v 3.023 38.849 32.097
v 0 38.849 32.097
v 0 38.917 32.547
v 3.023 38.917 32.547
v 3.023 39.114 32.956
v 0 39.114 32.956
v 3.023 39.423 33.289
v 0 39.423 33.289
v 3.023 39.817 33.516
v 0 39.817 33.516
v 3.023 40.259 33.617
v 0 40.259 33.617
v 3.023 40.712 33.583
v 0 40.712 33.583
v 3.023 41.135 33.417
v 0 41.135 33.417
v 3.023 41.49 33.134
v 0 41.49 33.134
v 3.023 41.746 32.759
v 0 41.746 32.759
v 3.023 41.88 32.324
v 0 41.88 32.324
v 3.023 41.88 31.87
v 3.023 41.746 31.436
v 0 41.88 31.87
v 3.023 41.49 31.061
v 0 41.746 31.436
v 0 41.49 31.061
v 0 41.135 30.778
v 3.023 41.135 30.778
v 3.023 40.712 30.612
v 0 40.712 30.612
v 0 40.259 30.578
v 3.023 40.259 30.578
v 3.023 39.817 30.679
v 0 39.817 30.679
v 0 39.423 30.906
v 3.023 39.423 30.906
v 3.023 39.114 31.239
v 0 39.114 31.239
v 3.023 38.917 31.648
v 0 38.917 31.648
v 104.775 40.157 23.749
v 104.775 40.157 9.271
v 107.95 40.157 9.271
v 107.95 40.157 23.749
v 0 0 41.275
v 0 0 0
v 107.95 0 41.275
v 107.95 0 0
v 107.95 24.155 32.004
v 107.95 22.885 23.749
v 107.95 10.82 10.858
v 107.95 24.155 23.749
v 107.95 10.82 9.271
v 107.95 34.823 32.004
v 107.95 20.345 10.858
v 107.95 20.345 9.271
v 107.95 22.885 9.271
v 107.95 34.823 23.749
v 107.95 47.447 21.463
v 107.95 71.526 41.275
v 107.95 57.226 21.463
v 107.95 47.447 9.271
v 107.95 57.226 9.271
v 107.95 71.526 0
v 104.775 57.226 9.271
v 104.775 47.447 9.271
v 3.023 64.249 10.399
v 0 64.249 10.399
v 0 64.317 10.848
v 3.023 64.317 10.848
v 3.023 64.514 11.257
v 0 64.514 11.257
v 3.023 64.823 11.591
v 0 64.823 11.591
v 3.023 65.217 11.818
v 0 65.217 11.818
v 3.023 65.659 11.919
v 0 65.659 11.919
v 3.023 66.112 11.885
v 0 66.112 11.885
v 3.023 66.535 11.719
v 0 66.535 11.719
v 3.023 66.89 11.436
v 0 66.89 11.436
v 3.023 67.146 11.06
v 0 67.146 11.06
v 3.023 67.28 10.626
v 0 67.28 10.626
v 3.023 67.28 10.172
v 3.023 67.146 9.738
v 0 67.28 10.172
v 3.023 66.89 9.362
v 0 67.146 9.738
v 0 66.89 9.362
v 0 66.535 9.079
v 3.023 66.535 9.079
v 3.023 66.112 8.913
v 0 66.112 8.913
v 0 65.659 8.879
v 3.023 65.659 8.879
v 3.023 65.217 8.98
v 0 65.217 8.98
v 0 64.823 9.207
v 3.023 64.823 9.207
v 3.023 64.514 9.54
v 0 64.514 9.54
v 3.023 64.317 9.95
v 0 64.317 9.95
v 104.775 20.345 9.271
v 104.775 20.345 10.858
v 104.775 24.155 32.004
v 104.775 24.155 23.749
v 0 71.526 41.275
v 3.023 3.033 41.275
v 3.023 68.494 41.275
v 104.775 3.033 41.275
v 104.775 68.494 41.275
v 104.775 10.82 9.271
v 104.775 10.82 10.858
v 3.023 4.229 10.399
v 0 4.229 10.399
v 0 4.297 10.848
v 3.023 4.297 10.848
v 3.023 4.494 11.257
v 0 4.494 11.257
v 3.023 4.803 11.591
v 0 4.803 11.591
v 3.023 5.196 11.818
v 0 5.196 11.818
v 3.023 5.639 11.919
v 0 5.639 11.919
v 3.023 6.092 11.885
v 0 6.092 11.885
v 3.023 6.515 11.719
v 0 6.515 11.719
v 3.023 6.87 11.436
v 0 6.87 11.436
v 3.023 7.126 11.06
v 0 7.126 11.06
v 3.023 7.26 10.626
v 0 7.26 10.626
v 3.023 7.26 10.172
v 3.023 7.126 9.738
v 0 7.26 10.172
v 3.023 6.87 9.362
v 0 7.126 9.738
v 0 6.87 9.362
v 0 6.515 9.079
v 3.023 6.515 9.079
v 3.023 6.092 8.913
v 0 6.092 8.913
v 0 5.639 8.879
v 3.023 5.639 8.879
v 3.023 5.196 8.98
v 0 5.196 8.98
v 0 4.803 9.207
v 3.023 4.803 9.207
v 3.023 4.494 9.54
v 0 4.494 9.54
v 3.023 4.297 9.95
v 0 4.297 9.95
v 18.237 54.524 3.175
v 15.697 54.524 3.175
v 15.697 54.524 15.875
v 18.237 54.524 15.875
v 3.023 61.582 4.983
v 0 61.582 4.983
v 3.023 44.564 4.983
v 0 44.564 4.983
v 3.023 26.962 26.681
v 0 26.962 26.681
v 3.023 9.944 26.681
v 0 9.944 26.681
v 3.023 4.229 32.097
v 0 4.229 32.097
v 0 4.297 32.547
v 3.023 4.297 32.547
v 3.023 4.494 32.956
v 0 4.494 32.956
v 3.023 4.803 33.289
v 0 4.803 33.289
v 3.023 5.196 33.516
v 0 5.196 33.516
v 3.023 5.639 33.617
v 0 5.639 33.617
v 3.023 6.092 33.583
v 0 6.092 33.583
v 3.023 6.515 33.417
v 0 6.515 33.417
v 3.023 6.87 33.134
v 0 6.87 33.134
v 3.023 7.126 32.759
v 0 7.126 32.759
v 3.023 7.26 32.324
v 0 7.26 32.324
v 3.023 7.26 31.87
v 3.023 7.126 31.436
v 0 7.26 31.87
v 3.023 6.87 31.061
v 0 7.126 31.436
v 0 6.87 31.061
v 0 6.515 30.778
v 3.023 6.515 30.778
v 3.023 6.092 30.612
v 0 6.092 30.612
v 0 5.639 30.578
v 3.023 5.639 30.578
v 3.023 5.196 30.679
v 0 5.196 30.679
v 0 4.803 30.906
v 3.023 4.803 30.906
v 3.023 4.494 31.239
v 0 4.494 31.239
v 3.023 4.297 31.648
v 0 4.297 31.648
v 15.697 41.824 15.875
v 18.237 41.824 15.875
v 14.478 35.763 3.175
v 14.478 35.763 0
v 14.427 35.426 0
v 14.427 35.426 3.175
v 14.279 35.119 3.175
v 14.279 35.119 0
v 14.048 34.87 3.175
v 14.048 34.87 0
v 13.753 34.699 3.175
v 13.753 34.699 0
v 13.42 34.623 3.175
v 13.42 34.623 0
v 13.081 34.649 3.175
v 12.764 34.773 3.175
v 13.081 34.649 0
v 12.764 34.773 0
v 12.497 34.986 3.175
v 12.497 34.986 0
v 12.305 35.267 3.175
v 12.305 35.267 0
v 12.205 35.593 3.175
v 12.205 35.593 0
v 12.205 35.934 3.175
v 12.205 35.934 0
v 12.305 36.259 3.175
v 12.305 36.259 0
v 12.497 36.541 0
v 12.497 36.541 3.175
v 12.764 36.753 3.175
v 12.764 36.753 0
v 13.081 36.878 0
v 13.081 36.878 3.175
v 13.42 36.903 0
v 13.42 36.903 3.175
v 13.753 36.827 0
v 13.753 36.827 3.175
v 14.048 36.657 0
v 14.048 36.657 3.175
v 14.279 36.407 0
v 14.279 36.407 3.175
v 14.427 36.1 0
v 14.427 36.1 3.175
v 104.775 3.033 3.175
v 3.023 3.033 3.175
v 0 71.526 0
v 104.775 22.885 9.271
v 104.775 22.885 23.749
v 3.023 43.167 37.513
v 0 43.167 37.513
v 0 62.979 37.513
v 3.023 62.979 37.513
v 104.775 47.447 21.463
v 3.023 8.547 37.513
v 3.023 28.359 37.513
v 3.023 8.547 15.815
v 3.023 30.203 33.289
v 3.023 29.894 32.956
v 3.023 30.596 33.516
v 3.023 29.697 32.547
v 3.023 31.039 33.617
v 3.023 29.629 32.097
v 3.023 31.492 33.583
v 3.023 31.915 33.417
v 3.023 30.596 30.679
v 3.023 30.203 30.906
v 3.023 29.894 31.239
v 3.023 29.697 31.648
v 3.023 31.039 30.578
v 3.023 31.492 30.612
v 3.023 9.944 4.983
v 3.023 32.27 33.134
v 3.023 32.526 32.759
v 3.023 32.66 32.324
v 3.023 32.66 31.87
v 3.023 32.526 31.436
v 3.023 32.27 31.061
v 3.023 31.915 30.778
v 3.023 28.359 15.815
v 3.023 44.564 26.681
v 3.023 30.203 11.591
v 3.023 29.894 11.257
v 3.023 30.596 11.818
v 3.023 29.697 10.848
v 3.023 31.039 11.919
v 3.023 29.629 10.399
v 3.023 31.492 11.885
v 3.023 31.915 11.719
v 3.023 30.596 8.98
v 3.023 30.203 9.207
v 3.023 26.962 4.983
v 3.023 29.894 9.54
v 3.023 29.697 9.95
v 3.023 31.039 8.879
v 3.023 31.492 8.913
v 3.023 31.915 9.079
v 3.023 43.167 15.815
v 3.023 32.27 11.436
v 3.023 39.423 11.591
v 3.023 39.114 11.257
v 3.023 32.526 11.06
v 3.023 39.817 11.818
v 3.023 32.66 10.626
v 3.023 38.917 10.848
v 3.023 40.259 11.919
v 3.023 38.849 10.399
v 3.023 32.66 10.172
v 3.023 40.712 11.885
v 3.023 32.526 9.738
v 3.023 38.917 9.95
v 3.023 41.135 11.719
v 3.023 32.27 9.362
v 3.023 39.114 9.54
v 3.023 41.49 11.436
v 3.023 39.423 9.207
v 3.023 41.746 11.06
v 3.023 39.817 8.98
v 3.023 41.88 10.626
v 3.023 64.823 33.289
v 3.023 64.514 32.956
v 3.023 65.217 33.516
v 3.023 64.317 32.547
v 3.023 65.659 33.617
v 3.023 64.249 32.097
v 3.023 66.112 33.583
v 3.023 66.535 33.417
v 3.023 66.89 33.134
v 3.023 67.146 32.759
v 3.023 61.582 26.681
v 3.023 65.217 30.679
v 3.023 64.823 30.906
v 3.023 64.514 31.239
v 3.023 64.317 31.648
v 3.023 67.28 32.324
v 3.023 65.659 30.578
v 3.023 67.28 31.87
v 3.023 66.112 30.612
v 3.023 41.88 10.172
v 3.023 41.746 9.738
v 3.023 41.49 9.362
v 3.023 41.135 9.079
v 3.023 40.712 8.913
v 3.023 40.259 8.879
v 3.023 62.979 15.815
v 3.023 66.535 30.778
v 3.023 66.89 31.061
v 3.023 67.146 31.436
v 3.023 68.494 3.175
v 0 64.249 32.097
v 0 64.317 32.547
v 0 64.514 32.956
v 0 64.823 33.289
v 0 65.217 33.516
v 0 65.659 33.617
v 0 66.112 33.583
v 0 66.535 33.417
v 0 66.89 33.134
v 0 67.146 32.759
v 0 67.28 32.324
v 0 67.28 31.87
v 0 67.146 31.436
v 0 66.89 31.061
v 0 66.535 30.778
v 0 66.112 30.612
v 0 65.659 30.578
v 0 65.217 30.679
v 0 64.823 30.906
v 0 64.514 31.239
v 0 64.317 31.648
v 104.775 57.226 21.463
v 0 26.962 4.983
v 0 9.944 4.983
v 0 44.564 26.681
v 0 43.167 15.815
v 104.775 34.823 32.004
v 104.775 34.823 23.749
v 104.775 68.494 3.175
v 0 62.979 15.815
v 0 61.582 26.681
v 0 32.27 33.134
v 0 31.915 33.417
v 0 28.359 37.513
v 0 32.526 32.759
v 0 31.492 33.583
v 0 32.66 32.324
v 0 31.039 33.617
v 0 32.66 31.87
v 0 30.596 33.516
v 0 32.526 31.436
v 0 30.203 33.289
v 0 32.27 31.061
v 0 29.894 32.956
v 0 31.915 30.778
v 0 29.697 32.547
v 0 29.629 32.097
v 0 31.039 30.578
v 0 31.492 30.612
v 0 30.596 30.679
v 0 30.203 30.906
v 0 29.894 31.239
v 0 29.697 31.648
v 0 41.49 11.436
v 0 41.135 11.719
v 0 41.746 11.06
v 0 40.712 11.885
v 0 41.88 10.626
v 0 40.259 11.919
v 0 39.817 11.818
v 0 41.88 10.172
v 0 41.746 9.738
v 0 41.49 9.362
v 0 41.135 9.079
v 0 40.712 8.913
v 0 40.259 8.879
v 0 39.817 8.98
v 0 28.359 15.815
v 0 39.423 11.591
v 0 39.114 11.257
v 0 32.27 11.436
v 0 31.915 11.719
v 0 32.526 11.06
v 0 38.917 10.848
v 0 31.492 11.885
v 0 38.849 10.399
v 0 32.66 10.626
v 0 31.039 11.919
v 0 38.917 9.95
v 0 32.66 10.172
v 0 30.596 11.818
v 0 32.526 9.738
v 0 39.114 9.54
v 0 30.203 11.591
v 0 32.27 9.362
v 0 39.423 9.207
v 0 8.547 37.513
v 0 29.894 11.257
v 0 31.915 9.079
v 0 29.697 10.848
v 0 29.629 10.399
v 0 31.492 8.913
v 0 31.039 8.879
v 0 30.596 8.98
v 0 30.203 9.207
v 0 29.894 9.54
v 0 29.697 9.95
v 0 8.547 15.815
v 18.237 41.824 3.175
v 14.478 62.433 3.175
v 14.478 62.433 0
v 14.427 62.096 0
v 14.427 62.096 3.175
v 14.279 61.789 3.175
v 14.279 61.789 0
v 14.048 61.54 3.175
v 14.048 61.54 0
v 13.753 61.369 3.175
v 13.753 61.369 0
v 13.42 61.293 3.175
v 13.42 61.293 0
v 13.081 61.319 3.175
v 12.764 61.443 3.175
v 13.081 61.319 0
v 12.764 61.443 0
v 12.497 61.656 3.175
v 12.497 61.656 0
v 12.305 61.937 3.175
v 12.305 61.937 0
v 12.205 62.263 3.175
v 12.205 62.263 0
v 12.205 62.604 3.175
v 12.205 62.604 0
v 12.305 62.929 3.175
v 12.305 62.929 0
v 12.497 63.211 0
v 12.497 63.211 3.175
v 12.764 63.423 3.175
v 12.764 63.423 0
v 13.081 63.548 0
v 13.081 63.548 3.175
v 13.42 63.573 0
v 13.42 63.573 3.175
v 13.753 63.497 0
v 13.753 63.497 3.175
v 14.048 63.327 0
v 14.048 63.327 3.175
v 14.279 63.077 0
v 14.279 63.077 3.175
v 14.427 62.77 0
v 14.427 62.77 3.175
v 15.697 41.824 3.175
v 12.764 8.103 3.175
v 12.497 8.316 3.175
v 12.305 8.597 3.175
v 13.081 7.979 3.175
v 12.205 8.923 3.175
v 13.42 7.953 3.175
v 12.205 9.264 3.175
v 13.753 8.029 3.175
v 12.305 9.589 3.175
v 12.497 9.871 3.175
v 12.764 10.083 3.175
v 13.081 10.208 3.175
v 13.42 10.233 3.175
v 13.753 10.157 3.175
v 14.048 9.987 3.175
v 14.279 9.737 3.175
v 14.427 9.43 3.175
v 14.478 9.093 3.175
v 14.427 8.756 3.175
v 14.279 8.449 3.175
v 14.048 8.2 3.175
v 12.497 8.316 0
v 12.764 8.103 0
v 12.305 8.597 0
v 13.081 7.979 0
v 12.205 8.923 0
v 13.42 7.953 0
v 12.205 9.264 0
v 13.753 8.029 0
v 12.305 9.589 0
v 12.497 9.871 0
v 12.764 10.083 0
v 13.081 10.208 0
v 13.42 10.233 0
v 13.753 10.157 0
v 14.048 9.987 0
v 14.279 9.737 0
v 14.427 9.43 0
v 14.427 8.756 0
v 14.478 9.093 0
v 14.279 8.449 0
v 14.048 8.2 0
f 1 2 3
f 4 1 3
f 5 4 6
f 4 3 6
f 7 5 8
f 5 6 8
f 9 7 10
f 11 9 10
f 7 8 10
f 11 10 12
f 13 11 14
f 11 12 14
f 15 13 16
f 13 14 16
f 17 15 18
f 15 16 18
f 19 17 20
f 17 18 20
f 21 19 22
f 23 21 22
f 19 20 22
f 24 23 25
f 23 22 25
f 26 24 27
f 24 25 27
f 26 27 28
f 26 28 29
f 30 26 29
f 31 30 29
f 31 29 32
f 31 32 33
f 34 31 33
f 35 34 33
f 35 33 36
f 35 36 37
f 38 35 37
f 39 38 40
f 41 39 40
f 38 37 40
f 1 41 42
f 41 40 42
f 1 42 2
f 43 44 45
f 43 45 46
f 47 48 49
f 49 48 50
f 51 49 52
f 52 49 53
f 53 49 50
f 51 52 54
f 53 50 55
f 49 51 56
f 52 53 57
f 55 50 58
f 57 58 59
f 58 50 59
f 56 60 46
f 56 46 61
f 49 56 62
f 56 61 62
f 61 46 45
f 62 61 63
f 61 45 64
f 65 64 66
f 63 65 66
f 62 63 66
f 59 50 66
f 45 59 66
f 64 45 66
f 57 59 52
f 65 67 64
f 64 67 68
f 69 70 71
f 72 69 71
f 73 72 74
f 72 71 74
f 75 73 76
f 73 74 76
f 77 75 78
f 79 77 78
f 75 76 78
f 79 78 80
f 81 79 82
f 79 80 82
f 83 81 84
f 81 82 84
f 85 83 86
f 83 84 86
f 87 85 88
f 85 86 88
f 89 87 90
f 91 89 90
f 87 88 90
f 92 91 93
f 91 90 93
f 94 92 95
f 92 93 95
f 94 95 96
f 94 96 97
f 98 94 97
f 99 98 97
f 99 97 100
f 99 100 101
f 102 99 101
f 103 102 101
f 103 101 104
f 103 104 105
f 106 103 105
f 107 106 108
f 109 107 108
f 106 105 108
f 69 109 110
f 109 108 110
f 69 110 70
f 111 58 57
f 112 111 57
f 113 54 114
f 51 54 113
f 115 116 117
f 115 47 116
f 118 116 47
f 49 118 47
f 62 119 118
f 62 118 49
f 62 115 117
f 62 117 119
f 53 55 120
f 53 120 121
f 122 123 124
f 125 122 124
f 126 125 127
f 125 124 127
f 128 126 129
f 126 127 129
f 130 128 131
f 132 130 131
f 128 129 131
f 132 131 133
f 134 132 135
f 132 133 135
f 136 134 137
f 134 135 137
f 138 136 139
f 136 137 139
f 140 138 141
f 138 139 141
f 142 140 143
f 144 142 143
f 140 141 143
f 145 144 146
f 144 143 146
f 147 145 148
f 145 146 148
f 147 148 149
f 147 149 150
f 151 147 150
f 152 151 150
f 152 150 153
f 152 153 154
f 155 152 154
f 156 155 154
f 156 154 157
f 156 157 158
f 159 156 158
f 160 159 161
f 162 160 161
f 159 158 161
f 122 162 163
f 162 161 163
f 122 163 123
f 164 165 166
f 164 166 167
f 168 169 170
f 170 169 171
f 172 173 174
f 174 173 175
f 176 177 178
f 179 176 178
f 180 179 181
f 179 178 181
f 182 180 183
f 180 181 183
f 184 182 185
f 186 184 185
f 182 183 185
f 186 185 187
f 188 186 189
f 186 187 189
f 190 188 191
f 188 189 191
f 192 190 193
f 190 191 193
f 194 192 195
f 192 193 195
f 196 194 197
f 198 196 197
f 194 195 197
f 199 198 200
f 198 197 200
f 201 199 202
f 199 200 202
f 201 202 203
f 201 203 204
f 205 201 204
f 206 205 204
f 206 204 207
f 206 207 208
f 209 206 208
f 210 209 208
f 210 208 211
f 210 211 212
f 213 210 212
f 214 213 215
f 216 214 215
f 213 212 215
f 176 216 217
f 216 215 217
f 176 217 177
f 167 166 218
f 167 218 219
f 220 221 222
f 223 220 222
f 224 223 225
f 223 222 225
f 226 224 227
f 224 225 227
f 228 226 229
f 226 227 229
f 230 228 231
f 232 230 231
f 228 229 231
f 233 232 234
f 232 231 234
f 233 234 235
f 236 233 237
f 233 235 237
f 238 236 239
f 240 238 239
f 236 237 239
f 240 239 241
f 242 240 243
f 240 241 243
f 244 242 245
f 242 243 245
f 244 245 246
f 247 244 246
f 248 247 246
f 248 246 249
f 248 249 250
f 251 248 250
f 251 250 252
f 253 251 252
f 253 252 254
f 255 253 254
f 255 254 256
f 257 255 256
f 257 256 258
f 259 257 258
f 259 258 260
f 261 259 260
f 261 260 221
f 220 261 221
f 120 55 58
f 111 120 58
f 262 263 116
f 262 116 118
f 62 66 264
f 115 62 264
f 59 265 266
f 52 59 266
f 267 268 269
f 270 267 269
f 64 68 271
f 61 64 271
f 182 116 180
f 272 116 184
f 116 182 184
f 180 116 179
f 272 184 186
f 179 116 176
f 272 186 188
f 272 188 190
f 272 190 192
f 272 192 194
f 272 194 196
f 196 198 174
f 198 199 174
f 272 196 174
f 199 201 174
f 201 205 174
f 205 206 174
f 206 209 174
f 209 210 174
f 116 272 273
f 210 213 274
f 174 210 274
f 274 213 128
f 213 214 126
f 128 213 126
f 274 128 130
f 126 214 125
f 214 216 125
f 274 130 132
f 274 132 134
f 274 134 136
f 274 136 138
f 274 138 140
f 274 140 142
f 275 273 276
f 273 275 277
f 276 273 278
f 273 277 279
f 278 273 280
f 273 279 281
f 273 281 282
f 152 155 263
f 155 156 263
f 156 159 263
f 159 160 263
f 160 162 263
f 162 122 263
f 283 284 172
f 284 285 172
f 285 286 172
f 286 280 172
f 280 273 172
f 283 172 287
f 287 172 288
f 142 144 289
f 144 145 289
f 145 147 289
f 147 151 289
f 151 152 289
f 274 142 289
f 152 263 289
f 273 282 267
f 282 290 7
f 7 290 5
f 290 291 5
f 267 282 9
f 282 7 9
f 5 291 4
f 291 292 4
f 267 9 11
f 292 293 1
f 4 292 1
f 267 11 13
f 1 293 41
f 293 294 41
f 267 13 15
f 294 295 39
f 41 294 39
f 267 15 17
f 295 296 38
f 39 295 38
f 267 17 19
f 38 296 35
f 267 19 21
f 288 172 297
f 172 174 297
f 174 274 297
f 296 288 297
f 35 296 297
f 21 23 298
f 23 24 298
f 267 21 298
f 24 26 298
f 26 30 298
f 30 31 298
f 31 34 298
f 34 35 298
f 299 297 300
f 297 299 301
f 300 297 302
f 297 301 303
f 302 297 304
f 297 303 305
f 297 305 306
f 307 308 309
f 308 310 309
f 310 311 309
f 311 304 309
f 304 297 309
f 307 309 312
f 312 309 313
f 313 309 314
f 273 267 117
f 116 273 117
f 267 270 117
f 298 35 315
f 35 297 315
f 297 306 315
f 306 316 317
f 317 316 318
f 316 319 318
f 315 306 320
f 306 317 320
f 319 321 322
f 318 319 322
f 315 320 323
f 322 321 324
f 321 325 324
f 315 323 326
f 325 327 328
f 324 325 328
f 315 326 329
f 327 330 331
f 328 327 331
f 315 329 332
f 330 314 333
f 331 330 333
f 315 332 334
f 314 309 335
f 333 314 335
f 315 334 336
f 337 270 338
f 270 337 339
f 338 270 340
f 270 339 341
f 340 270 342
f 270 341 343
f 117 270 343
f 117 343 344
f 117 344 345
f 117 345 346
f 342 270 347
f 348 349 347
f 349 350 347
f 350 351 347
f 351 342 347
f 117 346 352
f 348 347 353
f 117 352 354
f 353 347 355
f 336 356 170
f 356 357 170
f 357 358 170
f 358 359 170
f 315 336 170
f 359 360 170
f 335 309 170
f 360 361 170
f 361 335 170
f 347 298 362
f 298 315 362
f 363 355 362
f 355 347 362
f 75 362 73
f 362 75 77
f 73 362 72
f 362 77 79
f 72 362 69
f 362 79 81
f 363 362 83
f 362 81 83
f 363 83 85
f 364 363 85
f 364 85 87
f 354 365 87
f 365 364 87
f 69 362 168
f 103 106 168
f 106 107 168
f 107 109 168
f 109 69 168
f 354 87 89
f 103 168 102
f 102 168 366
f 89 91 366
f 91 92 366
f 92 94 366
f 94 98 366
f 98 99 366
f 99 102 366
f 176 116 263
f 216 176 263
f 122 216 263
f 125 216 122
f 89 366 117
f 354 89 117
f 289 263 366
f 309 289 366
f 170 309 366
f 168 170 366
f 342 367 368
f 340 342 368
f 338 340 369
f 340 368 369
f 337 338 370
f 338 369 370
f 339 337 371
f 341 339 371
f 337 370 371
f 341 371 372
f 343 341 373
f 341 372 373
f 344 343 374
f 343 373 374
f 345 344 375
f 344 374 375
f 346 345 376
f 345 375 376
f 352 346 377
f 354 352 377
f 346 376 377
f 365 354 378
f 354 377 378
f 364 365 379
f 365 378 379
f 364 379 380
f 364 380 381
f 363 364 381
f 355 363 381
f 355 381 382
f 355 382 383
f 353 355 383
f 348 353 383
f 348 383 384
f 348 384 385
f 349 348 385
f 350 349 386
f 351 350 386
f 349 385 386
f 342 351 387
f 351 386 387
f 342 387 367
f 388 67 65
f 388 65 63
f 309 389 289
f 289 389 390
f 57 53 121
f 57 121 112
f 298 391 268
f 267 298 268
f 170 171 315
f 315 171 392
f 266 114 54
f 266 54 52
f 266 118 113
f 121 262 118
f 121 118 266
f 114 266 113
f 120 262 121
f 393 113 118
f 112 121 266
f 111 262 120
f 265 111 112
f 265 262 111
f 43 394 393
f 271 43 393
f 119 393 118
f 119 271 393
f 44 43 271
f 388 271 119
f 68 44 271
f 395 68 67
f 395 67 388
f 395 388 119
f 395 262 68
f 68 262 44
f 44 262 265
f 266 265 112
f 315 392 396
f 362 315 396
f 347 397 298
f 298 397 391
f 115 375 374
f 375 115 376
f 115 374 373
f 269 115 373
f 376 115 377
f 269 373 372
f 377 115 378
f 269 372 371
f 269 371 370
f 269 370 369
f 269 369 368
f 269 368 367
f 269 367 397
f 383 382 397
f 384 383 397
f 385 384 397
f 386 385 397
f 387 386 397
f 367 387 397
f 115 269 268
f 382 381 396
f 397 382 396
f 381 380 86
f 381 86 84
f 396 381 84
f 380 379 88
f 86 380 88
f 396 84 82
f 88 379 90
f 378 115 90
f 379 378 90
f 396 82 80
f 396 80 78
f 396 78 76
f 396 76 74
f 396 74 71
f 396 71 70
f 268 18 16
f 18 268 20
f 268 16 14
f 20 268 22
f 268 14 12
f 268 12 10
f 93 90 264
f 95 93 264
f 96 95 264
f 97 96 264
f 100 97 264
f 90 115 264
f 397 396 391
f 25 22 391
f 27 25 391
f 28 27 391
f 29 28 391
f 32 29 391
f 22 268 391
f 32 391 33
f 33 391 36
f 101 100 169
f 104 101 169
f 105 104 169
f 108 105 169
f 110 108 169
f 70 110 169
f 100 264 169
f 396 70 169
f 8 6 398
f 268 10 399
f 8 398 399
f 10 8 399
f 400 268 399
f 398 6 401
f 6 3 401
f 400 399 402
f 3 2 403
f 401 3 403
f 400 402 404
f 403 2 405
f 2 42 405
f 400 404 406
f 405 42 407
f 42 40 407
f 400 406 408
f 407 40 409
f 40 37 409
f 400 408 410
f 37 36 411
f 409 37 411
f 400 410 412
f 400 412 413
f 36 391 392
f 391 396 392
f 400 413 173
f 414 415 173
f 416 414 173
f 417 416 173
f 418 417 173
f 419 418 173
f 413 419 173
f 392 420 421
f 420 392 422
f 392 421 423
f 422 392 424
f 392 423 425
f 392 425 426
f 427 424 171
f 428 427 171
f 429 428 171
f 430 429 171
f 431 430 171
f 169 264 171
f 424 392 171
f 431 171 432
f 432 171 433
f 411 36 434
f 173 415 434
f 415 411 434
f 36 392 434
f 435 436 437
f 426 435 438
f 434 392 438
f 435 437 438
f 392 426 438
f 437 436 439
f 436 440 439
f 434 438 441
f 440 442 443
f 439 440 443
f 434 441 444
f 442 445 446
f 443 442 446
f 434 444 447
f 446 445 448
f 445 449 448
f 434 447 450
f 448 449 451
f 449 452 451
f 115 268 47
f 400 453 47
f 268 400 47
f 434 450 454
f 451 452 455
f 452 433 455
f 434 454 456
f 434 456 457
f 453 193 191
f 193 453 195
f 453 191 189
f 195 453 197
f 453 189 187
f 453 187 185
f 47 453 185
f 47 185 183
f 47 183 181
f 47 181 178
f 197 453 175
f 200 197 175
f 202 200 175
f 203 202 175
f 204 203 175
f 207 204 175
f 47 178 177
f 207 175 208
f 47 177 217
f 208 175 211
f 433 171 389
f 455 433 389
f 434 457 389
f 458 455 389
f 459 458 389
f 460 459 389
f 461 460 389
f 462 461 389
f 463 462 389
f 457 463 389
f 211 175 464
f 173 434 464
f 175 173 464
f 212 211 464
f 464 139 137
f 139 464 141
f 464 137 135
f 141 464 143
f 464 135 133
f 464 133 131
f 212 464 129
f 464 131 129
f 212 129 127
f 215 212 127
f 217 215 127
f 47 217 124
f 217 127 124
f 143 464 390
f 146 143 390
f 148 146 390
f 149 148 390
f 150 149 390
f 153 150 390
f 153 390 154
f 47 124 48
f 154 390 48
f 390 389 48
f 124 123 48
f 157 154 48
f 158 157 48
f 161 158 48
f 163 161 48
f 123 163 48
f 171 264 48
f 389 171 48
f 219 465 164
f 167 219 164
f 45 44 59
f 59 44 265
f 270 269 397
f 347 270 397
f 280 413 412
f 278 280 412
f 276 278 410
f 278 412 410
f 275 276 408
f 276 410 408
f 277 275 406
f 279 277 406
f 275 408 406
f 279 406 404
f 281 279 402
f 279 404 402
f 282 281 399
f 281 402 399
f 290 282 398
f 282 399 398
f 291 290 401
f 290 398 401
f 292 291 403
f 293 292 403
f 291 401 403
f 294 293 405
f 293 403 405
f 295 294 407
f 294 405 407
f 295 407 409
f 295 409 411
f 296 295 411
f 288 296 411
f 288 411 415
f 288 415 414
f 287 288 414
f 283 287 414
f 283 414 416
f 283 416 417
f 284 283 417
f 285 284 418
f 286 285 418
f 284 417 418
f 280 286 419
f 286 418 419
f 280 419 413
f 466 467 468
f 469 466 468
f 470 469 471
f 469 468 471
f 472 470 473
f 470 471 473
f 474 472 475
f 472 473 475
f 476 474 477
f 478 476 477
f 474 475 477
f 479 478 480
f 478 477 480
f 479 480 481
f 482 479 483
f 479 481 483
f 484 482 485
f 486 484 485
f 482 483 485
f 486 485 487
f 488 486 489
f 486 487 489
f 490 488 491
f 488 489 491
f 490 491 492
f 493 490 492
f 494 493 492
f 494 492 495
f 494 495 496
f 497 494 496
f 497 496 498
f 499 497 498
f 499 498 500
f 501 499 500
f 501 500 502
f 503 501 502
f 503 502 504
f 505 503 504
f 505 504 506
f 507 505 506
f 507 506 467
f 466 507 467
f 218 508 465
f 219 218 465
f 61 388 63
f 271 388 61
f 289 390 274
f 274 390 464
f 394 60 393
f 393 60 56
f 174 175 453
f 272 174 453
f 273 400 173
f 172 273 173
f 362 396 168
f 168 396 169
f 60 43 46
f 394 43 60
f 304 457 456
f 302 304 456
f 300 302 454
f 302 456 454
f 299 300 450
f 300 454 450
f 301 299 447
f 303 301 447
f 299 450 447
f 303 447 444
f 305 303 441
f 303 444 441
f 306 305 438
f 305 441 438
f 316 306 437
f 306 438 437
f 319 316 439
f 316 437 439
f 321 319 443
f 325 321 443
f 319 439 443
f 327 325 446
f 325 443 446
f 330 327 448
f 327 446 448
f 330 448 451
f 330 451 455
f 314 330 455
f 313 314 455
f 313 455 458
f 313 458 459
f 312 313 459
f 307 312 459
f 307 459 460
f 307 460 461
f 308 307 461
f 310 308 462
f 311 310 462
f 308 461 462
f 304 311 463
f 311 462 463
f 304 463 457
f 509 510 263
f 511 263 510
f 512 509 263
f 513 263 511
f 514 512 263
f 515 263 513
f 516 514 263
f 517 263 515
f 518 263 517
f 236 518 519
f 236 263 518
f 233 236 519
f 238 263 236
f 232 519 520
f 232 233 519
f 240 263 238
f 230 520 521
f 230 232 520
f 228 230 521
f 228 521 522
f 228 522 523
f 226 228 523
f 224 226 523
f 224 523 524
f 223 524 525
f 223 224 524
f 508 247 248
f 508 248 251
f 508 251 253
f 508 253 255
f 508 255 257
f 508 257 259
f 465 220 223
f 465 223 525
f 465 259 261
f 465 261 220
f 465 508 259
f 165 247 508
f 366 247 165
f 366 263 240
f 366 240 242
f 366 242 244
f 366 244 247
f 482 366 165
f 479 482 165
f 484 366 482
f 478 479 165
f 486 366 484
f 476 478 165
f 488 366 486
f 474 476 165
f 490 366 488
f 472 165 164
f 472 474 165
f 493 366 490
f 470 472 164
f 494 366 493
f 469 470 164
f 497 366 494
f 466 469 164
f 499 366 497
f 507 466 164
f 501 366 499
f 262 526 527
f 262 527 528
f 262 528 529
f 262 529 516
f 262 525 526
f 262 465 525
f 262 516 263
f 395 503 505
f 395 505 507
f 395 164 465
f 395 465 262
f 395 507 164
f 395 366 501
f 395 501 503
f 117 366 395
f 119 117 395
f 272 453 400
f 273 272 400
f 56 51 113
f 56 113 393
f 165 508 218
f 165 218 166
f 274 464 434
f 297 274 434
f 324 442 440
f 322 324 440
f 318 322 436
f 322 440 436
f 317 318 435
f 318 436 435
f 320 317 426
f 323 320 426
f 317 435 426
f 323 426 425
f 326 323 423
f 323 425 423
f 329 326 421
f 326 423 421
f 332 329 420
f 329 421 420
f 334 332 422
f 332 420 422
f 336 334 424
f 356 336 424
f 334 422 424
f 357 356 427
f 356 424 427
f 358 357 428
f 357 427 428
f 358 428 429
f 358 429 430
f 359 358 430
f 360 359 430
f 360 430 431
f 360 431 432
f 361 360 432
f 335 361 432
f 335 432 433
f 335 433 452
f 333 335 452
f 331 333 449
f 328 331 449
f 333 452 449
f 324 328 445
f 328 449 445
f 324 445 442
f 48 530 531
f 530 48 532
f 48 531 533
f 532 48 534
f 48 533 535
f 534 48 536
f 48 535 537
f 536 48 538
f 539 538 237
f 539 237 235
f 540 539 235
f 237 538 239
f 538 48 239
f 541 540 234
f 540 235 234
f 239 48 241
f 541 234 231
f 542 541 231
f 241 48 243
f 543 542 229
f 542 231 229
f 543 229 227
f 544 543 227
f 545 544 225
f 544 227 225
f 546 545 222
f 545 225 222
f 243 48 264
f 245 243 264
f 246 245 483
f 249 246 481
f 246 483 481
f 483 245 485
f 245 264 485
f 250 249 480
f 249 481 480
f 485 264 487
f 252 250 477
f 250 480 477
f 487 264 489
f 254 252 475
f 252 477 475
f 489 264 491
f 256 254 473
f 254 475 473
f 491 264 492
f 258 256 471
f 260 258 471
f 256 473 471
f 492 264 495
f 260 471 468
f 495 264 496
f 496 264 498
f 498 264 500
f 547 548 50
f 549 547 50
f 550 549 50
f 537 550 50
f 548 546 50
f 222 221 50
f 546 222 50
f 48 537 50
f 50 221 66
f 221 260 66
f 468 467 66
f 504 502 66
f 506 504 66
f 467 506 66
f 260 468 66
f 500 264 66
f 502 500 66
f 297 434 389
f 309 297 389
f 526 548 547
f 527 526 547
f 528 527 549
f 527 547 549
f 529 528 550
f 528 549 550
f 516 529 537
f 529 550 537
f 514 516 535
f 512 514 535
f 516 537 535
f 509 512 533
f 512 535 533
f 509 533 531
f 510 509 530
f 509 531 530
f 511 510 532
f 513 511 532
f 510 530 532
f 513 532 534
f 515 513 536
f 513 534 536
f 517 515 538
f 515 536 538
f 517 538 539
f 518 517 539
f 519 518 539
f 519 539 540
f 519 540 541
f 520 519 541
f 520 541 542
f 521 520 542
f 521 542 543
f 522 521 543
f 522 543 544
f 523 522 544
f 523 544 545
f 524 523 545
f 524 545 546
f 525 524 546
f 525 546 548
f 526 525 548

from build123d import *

# Parameters (mm, degrees)
F0_W      = 107.95
F0_H      = 71.5264
F1_DEPTH  = 3.175
F2_W      = 101.7524
F2_H      = 65.46088
F3_DEPTH  = 38.1
F4_W      = 17.272
F4_H      = 14.478
F4_W_2    = 9.779
F4_H_2    = 12.192
F5_DEPTH  = 3.176
F6_W      = 9.525
F6_H      = 1.5875
F7_DEPTH  = 3.175
F8_DEPTH  = 3.176
F9_W      = 2.54
F9_H      = 12.7
F10_DEPTH = 12.7
F11_R     = 1.524
F12_DEPTH = 3.0226
F13_R     = 1.143
F14_DEPTH = 41.276
F15_W     = 10.668
F15_H     = 8.255
F16_DEPTH = 3.175


with BuildPart() as f1:
    # F0 (on Top) → F1 (new body)
    with BuildSketch(Plane.XY):
        with Locations((53.975, 35.7632)):
            Rectangle(F0_W, F0_H)
    extrude(amount=F1_DEPTH)

    # F2 (on face) → F3 (join)
    with BuildSketch(Plane.XY.offset(3.175)):
        Polygon((107.95, 71.5264), (0, 71.5264), (0, 68.49364), (0, 3.03276), (0, 0), (107.95, 0), align=None)
        with Locations((53.8988, 35.7632)):
            Rectangle(F2_W, F2_H, mode=Mode.SUBTRACT)
    extrude(amount=F3_DEPTH)

    # F4 (on face) → F5 (cut, through all)
    with BuildSketch(Plane(origin=(104.775, 0, 0), x_dir=(0, -1, 0), z_dir=(-1, 0, 0))):
        with Locations((-31.5214, 16.51)):
            Rectangle(F4_W, F4_H)
        with Locations((-52.3367, 15.367)):
            Rectangle(F4_W_2, F4_H_2)
    extrude(amount=-F5_DEPTH, mode=Mode.SUBTRACT)

    # F6 (on face) → F7 (cut, through all)
    with BuildSketch(Plane.YZ.offset(107.95)):
        with Locations((15.5829, 10.06475)):
            Rectangle(F6_W, F6_H)
    extrude(amount=-F7_DEPTH, mode=Mode.SUBTRACT)

    # F4 (on face) → F8 (cut, through all)
    with BuildSketch(Plane(origin=(104.775, 0, 0), x_dir=(0, -1, 0), z_dir=(-1, 0, 0))):
        with Locations((-31.5214, 16.51)):
            Rectangle(F4_W, F4_H)
        with Locations((-52.3367, 15.367)):
            Rectangle(F4_W_2, F4_H_2)
    extrude(amount=-F8_DEPTH, mode=Mode.SUBTRACT)

    # F9 (on face) → F10 (join)
    with BuildSketch(Plane.XY.offset(3.175)):
        with Locations((16.9672, 48.17364)):
            Rectangle(F9_W, F9_H)
    extrude(amount=F10_DEPTH)

    # F11 (on face) → F12 (cut, through all)
    with BuildSketch(Plane(origin=(0, 0, 0), x_dir=(0, -1, 0), z_dir=(-1, 0, 0))):
        Polygon((-43.1673, 37.513494), (-62.9793, 37.513494), (-61.5823, 26.681205), (-44.5643, 26.681205), align=None)
        Polygon((-43.1673, 15.815138), (-62.9793, 15.815138), (-61.5823, 4.98285), (-44.5643, 4.98285), align=None)
        Polygon((-8.5471, 37.513494), (-28.3591, 37.513494), (-26.9621, 26.681205), (-9.9441, 26.681205), align=None)
        Polygon((-8.5471, 15.815138), (-28.3591, 15.815138), (-26.9621, 4.98285), (-9.9441, 4.98285), align=None)
        with Locations((-40.3733, 32.09735)):
            Circle(F11_R)
        with Locations((-65.7733, 32.09735)):
            Circle(F11_R)
        with Locations((-65.7733, 10.398994)):
            Circle(F11_R)
        with Locations((-40.3733, 10.398994)):
            Circle(F11_R)
        with Locations((-31.1531, 10.398994)):
            Circle(F11_R)
        with Locations((-5.7531, 10.398994)):
            Circle(F11_R)
        with Locations((-5.7531, 32.09735)):
            Circle(F11_R)
        with Locations((-31.1531, 32.09735)):
            Circle(F11_R)
    extrude(amount=-F12_DEPTH, mode=Mode.SUBTRACT)

    # F13 (on face) → F14 (cut, through all)
    with BuildSketch(Plane(origin=(0, 0, 0), x_dir=(1, 0, 0), z_dir=(0, 0, -1))):
        with Locations((13.335, -62.4332)):
            Circle(F13_R)
        with Locations((13.335, -35.7632)):
            Circle(F13_R)
        with Locations((13.335, -9.0932)):
            Circle(F13_R)
    extrude(amount=-F14_DEPTH, mode=Mode.SUBTRACT)

    # F15 (on face) → F16 (cut, through all)
    with BuildSketch(Plane.YZ.offset(107.95)):
        with Locations((29.4894, 27.8765)):
            Rectangle(F15_W, F15_H)
    extrude(amount=-F16_DEPTH, mode=Mode.SUBTRACT)


solid = f1.part
